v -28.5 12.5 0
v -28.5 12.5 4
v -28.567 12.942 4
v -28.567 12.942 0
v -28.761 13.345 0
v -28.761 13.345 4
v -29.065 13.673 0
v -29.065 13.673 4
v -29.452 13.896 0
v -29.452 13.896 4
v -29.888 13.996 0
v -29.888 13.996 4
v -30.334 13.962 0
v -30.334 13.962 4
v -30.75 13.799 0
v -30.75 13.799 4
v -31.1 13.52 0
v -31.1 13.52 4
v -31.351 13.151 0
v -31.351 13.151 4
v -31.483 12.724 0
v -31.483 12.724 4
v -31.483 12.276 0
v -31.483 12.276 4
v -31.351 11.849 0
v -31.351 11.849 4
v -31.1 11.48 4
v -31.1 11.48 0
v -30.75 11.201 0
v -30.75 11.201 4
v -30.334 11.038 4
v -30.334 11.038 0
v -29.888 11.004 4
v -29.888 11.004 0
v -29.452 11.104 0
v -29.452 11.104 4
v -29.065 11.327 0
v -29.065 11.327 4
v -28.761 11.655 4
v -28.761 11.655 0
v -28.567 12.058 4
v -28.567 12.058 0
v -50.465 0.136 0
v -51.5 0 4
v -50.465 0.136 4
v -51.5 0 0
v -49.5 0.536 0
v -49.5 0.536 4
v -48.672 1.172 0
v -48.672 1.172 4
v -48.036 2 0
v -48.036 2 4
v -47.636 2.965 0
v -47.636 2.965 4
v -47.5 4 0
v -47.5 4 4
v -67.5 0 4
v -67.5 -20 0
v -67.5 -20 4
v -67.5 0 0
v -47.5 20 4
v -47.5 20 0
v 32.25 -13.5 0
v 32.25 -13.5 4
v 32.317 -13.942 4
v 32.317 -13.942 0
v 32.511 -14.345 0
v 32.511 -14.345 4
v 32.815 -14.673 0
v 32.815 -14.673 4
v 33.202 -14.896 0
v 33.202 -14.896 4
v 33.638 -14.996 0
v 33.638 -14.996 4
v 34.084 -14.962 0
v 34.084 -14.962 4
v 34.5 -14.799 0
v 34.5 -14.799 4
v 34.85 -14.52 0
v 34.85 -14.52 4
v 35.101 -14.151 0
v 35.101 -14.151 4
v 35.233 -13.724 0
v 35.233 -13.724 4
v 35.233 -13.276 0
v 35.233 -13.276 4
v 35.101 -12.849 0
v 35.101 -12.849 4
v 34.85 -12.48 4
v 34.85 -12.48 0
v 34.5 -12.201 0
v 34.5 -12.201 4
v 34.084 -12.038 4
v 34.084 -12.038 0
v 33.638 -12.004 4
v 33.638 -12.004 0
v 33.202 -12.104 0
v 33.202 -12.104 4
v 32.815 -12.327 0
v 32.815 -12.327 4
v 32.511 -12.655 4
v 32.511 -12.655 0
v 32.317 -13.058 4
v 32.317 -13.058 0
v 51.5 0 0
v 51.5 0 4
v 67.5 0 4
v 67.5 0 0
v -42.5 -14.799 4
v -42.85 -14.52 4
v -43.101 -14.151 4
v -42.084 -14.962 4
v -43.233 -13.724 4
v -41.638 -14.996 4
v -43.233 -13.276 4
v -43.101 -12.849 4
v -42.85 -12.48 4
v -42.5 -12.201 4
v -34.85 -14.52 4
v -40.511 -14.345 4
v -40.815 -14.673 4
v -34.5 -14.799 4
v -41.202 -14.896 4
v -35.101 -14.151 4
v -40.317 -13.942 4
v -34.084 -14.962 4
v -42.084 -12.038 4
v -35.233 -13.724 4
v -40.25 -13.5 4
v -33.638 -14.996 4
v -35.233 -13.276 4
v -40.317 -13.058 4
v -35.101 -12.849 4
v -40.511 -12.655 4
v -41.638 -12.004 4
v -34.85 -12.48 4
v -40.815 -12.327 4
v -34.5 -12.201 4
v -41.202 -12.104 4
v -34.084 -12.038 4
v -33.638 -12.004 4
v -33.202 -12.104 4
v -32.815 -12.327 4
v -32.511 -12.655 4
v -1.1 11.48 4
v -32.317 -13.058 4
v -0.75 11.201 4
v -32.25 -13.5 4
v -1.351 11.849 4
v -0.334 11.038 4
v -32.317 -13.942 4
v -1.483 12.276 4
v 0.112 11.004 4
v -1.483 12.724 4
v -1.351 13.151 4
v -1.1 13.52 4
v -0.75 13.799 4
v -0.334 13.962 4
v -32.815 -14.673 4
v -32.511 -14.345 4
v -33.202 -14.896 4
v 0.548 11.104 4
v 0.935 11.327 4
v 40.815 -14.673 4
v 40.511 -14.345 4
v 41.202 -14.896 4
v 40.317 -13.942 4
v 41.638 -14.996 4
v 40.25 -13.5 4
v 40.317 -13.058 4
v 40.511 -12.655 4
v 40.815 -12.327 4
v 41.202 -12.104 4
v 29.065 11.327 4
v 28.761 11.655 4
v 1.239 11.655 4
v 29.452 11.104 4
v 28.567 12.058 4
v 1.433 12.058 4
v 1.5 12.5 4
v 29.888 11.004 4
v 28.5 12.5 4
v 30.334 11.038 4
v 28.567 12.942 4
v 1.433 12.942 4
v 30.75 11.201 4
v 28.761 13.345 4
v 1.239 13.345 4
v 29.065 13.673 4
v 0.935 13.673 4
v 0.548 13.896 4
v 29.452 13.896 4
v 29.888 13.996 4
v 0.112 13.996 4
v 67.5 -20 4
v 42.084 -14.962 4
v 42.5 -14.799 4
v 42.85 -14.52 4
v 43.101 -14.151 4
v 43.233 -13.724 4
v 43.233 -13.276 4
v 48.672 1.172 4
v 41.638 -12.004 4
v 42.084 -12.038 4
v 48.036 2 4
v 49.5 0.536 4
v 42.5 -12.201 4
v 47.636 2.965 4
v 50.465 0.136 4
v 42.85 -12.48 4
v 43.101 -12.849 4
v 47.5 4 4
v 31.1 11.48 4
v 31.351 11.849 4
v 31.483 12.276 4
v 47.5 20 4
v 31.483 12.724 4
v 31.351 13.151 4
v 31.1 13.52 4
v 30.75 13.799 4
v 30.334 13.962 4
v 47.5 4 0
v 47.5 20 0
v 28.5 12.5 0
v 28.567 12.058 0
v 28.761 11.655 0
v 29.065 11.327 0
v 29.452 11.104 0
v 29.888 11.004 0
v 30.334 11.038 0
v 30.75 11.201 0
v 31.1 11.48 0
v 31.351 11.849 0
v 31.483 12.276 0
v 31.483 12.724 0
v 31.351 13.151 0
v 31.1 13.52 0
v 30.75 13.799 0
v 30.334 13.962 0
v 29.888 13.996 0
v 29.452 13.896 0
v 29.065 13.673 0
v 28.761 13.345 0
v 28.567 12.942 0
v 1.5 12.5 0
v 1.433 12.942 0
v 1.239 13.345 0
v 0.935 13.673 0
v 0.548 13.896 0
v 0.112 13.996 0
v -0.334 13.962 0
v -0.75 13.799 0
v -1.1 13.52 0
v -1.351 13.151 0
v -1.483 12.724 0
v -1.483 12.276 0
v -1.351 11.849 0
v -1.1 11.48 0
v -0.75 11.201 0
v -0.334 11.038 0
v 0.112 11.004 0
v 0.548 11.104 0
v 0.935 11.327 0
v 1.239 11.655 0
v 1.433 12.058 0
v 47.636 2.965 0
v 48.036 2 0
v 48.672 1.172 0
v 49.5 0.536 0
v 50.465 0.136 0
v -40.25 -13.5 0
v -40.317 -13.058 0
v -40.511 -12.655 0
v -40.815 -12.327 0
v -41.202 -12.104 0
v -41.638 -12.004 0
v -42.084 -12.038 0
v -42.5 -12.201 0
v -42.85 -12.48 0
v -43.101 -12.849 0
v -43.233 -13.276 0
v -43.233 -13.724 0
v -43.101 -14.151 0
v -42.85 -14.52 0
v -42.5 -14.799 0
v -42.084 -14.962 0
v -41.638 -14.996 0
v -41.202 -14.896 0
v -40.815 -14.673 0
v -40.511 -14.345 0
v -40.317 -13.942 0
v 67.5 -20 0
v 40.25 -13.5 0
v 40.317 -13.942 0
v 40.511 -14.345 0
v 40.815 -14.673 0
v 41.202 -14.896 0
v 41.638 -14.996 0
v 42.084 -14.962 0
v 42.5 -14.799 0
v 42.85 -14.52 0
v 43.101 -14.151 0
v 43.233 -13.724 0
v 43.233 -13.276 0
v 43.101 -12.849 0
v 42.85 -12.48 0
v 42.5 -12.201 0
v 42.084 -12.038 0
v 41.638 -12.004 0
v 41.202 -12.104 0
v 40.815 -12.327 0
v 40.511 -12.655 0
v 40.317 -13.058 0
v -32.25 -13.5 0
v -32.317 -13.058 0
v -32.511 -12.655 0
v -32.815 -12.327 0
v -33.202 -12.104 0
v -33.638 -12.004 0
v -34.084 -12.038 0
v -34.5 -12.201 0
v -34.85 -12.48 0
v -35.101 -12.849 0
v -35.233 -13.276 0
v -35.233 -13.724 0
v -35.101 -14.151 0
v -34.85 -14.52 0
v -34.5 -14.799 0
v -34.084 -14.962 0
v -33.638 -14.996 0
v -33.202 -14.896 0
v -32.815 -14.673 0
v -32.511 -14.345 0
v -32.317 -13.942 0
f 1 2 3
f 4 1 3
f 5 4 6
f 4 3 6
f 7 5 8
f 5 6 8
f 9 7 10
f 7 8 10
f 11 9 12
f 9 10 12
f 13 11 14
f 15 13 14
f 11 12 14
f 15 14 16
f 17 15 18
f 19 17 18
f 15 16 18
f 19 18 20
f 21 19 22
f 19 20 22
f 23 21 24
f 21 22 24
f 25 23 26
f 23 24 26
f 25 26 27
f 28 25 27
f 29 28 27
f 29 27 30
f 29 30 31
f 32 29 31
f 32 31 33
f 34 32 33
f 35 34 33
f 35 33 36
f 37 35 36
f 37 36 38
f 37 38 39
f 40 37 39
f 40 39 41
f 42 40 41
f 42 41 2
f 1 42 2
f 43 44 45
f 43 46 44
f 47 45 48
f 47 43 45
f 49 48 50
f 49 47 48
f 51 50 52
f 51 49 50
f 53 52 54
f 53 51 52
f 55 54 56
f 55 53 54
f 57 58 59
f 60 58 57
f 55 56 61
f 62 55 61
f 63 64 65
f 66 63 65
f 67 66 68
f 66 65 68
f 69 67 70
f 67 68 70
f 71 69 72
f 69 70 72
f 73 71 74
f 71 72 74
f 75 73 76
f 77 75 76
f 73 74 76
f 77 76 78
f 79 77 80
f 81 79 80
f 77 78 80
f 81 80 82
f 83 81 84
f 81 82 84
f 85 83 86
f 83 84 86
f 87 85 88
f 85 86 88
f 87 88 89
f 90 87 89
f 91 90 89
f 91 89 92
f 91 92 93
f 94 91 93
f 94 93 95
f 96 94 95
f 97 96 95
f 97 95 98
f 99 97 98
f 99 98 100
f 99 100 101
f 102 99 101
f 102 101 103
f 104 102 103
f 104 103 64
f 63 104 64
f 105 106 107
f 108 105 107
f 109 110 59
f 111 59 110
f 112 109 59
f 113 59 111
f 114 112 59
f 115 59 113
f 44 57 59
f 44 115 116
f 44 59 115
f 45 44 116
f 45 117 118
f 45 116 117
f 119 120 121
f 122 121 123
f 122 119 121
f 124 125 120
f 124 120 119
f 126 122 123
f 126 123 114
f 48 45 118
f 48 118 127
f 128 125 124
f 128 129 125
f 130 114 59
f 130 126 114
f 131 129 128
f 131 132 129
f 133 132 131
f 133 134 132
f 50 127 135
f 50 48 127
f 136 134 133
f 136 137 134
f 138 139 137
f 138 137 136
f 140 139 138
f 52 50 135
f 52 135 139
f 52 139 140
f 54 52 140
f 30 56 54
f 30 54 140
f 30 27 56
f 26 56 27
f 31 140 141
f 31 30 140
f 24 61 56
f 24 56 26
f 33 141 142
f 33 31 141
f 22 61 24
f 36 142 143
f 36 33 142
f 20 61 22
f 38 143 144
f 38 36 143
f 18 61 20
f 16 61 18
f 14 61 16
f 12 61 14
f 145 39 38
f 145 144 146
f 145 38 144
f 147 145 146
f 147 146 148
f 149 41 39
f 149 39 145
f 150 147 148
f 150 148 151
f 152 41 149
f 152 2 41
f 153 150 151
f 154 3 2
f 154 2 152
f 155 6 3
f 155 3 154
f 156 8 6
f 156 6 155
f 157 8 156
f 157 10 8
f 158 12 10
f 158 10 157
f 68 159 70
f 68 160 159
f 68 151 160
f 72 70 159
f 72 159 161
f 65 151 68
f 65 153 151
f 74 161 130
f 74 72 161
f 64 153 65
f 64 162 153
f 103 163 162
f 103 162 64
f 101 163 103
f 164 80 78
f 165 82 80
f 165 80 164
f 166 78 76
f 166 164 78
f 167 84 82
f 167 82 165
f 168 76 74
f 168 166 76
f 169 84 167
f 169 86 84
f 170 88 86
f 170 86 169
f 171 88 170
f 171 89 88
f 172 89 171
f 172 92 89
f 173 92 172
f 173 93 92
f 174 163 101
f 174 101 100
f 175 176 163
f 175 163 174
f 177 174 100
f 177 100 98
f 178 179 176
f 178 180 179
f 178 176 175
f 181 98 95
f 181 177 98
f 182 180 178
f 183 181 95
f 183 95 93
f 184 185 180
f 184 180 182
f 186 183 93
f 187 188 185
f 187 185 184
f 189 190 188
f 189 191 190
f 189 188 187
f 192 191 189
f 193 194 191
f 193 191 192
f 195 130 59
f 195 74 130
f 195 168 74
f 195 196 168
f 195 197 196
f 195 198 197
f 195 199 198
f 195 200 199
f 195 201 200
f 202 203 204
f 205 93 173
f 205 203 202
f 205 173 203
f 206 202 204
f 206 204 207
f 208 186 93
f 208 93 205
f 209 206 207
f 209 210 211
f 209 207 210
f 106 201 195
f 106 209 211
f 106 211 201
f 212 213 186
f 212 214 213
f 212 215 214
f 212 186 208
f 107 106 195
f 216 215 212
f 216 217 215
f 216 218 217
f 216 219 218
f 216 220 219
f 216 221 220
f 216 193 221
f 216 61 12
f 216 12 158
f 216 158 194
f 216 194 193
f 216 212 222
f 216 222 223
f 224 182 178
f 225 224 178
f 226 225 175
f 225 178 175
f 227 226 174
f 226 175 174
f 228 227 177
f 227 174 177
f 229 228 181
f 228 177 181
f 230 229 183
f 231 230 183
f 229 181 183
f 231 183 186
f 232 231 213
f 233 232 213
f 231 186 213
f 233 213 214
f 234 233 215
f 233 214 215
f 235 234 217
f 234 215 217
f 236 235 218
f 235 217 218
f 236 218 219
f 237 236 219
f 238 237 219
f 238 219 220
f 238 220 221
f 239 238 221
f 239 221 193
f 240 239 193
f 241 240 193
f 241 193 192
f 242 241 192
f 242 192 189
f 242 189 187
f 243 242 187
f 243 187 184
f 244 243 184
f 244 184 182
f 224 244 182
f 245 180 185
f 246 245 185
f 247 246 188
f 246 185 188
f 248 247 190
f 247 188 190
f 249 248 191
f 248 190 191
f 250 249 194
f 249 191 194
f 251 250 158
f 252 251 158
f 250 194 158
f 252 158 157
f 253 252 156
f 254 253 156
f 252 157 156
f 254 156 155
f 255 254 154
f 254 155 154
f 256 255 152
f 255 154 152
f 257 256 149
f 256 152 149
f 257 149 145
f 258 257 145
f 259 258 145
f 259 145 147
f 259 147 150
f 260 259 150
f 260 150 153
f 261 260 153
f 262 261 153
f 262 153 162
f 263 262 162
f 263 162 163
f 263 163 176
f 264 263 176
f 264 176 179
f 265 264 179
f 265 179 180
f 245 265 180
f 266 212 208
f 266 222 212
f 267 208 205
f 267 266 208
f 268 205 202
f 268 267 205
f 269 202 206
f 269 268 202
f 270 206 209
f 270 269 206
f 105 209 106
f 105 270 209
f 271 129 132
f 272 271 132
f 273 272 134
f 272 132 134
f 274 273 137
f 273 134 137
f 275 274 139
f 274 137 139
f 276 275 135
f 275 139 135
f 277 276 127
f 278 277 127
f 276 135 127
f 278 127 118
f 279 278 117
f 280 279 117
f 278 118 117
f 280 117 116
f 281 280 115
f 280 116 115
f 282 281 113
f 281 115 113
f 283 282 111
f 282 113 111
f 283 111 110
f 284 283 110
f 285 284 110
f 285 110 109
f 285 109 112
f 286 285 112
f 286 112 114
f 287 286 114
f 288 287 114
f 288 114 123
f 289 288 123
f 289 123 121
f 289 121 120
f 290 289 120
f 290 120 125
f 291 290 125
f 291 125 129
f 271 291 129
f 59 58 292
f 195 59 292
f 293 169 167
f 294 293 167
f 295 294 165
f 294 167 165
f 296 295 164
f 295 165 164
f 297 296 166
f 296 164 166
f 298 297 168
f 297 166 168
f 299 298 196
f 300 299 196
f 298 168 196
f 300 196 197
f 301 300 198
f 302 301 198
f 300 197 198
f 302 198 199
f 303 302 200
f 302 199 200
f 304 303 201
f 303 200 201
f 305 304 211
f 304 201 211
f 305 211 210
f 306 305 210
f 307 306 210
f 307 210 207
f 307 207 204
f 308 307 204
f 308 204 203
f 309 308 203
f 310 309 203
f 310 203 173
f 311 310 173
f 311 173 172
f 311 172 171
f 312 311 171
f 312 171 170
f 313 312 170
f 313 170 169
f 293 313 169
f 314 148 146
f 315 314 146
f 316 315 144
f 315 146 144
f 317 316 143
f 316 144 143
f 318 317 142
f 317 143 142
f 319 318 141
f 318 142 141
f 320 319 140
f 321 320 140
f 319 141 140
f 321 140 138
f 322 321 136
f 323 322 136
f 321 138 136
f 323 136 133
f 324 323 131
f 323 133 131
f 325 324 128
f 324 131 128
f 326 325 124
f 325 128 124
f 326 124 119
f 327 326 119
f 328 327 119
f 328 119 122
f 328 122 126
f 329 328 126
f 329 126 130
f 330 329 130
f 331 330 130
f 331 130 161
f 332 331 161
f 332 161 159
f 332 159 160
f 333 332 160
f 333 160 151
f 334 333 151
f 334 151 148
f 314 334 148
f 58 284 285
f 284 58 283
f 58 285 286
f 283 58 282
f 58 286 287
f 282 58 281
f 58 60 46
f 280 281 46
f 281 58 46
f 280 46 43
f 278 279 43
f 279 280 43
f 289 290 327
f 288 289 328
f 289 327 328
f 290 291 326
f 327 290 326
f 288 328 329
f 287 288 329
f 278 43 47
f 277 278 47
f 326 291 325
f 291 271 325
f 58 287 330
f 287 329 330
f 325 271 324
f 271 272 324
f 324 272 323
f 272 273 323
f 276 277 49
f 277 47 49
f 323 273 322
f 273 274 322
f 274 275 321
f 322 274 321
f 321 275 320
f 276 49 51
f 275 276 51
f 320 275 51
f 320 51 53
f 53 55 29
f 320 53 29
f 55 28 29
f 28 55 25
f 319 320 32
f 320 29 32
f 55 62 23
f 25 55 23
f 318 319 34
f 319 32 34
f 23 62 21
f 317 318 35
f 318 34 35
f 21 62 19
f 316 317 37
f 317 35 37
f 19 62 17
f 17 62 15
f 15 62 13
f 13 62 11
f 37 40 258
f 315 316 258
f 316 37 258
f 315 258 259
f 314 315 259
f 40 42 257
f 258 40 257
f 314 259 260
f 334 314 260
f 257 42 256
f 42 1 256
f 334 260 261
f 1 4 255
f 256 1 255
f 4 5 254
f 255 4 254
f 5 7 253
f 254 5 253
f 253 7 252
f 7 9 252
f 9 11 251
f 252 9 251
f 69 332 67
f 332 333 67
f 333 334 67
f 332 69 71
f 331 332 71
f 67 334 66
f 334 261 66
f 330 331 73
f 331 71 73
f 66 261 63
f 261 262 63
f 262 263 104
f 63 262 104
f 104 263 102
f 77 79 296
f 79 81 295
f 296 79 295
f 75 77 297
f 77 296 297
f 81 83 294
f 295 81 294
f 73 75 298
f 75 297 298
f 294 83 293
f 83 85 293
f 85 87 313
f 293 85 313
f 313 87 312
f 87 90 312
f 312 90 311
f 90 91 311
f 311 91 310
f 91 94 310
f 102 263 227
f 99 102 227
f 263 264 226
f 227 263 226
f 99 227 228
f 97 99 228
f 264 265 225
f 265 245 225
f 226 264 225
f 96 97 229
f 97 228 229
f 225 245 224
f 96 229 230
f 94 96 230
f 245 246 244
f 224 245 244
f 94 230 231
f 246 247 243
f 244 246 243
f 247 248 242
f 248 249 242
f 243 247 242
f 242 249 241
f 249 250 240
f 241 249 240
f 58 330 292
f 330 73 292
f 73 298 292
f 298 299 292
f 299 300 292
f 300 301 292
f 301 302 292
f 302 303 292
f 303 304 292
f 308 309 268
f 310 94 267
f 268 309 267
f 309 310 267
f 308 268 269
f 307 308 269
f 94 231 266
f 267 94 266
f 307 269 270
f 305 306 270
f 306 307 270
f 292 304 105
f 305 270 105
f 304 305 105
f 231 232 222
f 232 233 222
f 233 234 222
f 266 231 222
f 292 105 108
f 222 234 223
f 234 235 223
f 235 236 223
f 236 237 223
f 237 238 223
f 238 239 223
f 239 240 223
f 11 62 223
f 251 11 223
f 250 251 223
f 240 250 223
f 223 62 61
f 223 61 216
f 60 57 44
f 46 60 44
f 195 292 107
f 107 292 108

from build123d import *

# Parameters (mm, degrees)
SKETCH_1_W          = 135
SKETCH_1_H          = 40
EXTRUDE_1_DEPTH     = 4
SKETCH_2_W          = 20
SKETCH_2_H          = 20
CUT_EXTRUDE_1_DEPTH = 71.514182971
FILLET_1_R          = 4
SKETCH_3_R          = 1.5
CUT_EXTRUDE_2_DEPTH = 71.514182971
SKETCH_4_R          = 1.5
CUT_EXTRUDE_3_DEPTH = 71.514182971


with BuildPart() as part:
    # 草图1 → 凸台-拉伸1 (new body)
    with BuildSketch(Plane.XY):
        Rectangle(SKETCH_1_W, SKETCH_1_H)
    extrude(amount=EXTRUDE_1_DEPTH)

    # 草图2 → 切除-拉伸1 (cut, through all)
    with BuildSketch(Plane.XY.offset(4)):
        with Locations((-57.5, 10)):
            Rectangle(SKETCH_2_W, SKETCH_2_H)
        with Locations((57.5, 10)):
            Rectangle(SKETCH_2_W, SKETCH_2_H)
    extrude(amount=-CUT_EXTRUDE_1_DEPTH, mode=Mode.SUBTRACT)

    # 圆角1
    fillet_1_edges = [part.edges().sort_by_distance(p)[0] for p in [
        (-47.5, 0, 2),
        (47.5, 0, 2),
    ]]
    fillet(fillet_1_edges, radius=FILLET_1_R)

    # 草图3 → 切除-拉伸2 (cut, through all)
    with BuildSketch(Plane.XY.offset(4)):
        with Locations((0, 12.5)):
            Circle(SKETCH_3_R)
        with Locations((-30, 12.5)):
            Circle(SKETCH_3_R)
        with Locations(Location((30, 12.5, 0), (0, 0, 180))):
            Circle(SKETCH_3_R)
    extrude(amount=-CUT_EXTRUDE_2_DEPTH, mode=Mode.SUBTRACT)

    # 草图4 → 切除-拉伸3 (cut, through all)
    with BuildSketch(Plane.XY.offset(4)):
        with Locations((-41.75, -13.5)):
            Circle(SKETCH_4_R)
        with Locations((-33.75, -13.5)):
            Circle(SKETCH_4_R)
        with Locations(Location((33.75, -13.5, 0), (0, 0, 180))):
            Circle(SKETCH_4_R)
        with Locations(Location((41.75, -13.5, 0), (0, 0, 180))):
            Circle(SKETCH_4_R)
    extrude(amount=-CUT_EXTRUDE_3_DEPTH, mode=Mode.SUBTRACT)


solid = part.part
